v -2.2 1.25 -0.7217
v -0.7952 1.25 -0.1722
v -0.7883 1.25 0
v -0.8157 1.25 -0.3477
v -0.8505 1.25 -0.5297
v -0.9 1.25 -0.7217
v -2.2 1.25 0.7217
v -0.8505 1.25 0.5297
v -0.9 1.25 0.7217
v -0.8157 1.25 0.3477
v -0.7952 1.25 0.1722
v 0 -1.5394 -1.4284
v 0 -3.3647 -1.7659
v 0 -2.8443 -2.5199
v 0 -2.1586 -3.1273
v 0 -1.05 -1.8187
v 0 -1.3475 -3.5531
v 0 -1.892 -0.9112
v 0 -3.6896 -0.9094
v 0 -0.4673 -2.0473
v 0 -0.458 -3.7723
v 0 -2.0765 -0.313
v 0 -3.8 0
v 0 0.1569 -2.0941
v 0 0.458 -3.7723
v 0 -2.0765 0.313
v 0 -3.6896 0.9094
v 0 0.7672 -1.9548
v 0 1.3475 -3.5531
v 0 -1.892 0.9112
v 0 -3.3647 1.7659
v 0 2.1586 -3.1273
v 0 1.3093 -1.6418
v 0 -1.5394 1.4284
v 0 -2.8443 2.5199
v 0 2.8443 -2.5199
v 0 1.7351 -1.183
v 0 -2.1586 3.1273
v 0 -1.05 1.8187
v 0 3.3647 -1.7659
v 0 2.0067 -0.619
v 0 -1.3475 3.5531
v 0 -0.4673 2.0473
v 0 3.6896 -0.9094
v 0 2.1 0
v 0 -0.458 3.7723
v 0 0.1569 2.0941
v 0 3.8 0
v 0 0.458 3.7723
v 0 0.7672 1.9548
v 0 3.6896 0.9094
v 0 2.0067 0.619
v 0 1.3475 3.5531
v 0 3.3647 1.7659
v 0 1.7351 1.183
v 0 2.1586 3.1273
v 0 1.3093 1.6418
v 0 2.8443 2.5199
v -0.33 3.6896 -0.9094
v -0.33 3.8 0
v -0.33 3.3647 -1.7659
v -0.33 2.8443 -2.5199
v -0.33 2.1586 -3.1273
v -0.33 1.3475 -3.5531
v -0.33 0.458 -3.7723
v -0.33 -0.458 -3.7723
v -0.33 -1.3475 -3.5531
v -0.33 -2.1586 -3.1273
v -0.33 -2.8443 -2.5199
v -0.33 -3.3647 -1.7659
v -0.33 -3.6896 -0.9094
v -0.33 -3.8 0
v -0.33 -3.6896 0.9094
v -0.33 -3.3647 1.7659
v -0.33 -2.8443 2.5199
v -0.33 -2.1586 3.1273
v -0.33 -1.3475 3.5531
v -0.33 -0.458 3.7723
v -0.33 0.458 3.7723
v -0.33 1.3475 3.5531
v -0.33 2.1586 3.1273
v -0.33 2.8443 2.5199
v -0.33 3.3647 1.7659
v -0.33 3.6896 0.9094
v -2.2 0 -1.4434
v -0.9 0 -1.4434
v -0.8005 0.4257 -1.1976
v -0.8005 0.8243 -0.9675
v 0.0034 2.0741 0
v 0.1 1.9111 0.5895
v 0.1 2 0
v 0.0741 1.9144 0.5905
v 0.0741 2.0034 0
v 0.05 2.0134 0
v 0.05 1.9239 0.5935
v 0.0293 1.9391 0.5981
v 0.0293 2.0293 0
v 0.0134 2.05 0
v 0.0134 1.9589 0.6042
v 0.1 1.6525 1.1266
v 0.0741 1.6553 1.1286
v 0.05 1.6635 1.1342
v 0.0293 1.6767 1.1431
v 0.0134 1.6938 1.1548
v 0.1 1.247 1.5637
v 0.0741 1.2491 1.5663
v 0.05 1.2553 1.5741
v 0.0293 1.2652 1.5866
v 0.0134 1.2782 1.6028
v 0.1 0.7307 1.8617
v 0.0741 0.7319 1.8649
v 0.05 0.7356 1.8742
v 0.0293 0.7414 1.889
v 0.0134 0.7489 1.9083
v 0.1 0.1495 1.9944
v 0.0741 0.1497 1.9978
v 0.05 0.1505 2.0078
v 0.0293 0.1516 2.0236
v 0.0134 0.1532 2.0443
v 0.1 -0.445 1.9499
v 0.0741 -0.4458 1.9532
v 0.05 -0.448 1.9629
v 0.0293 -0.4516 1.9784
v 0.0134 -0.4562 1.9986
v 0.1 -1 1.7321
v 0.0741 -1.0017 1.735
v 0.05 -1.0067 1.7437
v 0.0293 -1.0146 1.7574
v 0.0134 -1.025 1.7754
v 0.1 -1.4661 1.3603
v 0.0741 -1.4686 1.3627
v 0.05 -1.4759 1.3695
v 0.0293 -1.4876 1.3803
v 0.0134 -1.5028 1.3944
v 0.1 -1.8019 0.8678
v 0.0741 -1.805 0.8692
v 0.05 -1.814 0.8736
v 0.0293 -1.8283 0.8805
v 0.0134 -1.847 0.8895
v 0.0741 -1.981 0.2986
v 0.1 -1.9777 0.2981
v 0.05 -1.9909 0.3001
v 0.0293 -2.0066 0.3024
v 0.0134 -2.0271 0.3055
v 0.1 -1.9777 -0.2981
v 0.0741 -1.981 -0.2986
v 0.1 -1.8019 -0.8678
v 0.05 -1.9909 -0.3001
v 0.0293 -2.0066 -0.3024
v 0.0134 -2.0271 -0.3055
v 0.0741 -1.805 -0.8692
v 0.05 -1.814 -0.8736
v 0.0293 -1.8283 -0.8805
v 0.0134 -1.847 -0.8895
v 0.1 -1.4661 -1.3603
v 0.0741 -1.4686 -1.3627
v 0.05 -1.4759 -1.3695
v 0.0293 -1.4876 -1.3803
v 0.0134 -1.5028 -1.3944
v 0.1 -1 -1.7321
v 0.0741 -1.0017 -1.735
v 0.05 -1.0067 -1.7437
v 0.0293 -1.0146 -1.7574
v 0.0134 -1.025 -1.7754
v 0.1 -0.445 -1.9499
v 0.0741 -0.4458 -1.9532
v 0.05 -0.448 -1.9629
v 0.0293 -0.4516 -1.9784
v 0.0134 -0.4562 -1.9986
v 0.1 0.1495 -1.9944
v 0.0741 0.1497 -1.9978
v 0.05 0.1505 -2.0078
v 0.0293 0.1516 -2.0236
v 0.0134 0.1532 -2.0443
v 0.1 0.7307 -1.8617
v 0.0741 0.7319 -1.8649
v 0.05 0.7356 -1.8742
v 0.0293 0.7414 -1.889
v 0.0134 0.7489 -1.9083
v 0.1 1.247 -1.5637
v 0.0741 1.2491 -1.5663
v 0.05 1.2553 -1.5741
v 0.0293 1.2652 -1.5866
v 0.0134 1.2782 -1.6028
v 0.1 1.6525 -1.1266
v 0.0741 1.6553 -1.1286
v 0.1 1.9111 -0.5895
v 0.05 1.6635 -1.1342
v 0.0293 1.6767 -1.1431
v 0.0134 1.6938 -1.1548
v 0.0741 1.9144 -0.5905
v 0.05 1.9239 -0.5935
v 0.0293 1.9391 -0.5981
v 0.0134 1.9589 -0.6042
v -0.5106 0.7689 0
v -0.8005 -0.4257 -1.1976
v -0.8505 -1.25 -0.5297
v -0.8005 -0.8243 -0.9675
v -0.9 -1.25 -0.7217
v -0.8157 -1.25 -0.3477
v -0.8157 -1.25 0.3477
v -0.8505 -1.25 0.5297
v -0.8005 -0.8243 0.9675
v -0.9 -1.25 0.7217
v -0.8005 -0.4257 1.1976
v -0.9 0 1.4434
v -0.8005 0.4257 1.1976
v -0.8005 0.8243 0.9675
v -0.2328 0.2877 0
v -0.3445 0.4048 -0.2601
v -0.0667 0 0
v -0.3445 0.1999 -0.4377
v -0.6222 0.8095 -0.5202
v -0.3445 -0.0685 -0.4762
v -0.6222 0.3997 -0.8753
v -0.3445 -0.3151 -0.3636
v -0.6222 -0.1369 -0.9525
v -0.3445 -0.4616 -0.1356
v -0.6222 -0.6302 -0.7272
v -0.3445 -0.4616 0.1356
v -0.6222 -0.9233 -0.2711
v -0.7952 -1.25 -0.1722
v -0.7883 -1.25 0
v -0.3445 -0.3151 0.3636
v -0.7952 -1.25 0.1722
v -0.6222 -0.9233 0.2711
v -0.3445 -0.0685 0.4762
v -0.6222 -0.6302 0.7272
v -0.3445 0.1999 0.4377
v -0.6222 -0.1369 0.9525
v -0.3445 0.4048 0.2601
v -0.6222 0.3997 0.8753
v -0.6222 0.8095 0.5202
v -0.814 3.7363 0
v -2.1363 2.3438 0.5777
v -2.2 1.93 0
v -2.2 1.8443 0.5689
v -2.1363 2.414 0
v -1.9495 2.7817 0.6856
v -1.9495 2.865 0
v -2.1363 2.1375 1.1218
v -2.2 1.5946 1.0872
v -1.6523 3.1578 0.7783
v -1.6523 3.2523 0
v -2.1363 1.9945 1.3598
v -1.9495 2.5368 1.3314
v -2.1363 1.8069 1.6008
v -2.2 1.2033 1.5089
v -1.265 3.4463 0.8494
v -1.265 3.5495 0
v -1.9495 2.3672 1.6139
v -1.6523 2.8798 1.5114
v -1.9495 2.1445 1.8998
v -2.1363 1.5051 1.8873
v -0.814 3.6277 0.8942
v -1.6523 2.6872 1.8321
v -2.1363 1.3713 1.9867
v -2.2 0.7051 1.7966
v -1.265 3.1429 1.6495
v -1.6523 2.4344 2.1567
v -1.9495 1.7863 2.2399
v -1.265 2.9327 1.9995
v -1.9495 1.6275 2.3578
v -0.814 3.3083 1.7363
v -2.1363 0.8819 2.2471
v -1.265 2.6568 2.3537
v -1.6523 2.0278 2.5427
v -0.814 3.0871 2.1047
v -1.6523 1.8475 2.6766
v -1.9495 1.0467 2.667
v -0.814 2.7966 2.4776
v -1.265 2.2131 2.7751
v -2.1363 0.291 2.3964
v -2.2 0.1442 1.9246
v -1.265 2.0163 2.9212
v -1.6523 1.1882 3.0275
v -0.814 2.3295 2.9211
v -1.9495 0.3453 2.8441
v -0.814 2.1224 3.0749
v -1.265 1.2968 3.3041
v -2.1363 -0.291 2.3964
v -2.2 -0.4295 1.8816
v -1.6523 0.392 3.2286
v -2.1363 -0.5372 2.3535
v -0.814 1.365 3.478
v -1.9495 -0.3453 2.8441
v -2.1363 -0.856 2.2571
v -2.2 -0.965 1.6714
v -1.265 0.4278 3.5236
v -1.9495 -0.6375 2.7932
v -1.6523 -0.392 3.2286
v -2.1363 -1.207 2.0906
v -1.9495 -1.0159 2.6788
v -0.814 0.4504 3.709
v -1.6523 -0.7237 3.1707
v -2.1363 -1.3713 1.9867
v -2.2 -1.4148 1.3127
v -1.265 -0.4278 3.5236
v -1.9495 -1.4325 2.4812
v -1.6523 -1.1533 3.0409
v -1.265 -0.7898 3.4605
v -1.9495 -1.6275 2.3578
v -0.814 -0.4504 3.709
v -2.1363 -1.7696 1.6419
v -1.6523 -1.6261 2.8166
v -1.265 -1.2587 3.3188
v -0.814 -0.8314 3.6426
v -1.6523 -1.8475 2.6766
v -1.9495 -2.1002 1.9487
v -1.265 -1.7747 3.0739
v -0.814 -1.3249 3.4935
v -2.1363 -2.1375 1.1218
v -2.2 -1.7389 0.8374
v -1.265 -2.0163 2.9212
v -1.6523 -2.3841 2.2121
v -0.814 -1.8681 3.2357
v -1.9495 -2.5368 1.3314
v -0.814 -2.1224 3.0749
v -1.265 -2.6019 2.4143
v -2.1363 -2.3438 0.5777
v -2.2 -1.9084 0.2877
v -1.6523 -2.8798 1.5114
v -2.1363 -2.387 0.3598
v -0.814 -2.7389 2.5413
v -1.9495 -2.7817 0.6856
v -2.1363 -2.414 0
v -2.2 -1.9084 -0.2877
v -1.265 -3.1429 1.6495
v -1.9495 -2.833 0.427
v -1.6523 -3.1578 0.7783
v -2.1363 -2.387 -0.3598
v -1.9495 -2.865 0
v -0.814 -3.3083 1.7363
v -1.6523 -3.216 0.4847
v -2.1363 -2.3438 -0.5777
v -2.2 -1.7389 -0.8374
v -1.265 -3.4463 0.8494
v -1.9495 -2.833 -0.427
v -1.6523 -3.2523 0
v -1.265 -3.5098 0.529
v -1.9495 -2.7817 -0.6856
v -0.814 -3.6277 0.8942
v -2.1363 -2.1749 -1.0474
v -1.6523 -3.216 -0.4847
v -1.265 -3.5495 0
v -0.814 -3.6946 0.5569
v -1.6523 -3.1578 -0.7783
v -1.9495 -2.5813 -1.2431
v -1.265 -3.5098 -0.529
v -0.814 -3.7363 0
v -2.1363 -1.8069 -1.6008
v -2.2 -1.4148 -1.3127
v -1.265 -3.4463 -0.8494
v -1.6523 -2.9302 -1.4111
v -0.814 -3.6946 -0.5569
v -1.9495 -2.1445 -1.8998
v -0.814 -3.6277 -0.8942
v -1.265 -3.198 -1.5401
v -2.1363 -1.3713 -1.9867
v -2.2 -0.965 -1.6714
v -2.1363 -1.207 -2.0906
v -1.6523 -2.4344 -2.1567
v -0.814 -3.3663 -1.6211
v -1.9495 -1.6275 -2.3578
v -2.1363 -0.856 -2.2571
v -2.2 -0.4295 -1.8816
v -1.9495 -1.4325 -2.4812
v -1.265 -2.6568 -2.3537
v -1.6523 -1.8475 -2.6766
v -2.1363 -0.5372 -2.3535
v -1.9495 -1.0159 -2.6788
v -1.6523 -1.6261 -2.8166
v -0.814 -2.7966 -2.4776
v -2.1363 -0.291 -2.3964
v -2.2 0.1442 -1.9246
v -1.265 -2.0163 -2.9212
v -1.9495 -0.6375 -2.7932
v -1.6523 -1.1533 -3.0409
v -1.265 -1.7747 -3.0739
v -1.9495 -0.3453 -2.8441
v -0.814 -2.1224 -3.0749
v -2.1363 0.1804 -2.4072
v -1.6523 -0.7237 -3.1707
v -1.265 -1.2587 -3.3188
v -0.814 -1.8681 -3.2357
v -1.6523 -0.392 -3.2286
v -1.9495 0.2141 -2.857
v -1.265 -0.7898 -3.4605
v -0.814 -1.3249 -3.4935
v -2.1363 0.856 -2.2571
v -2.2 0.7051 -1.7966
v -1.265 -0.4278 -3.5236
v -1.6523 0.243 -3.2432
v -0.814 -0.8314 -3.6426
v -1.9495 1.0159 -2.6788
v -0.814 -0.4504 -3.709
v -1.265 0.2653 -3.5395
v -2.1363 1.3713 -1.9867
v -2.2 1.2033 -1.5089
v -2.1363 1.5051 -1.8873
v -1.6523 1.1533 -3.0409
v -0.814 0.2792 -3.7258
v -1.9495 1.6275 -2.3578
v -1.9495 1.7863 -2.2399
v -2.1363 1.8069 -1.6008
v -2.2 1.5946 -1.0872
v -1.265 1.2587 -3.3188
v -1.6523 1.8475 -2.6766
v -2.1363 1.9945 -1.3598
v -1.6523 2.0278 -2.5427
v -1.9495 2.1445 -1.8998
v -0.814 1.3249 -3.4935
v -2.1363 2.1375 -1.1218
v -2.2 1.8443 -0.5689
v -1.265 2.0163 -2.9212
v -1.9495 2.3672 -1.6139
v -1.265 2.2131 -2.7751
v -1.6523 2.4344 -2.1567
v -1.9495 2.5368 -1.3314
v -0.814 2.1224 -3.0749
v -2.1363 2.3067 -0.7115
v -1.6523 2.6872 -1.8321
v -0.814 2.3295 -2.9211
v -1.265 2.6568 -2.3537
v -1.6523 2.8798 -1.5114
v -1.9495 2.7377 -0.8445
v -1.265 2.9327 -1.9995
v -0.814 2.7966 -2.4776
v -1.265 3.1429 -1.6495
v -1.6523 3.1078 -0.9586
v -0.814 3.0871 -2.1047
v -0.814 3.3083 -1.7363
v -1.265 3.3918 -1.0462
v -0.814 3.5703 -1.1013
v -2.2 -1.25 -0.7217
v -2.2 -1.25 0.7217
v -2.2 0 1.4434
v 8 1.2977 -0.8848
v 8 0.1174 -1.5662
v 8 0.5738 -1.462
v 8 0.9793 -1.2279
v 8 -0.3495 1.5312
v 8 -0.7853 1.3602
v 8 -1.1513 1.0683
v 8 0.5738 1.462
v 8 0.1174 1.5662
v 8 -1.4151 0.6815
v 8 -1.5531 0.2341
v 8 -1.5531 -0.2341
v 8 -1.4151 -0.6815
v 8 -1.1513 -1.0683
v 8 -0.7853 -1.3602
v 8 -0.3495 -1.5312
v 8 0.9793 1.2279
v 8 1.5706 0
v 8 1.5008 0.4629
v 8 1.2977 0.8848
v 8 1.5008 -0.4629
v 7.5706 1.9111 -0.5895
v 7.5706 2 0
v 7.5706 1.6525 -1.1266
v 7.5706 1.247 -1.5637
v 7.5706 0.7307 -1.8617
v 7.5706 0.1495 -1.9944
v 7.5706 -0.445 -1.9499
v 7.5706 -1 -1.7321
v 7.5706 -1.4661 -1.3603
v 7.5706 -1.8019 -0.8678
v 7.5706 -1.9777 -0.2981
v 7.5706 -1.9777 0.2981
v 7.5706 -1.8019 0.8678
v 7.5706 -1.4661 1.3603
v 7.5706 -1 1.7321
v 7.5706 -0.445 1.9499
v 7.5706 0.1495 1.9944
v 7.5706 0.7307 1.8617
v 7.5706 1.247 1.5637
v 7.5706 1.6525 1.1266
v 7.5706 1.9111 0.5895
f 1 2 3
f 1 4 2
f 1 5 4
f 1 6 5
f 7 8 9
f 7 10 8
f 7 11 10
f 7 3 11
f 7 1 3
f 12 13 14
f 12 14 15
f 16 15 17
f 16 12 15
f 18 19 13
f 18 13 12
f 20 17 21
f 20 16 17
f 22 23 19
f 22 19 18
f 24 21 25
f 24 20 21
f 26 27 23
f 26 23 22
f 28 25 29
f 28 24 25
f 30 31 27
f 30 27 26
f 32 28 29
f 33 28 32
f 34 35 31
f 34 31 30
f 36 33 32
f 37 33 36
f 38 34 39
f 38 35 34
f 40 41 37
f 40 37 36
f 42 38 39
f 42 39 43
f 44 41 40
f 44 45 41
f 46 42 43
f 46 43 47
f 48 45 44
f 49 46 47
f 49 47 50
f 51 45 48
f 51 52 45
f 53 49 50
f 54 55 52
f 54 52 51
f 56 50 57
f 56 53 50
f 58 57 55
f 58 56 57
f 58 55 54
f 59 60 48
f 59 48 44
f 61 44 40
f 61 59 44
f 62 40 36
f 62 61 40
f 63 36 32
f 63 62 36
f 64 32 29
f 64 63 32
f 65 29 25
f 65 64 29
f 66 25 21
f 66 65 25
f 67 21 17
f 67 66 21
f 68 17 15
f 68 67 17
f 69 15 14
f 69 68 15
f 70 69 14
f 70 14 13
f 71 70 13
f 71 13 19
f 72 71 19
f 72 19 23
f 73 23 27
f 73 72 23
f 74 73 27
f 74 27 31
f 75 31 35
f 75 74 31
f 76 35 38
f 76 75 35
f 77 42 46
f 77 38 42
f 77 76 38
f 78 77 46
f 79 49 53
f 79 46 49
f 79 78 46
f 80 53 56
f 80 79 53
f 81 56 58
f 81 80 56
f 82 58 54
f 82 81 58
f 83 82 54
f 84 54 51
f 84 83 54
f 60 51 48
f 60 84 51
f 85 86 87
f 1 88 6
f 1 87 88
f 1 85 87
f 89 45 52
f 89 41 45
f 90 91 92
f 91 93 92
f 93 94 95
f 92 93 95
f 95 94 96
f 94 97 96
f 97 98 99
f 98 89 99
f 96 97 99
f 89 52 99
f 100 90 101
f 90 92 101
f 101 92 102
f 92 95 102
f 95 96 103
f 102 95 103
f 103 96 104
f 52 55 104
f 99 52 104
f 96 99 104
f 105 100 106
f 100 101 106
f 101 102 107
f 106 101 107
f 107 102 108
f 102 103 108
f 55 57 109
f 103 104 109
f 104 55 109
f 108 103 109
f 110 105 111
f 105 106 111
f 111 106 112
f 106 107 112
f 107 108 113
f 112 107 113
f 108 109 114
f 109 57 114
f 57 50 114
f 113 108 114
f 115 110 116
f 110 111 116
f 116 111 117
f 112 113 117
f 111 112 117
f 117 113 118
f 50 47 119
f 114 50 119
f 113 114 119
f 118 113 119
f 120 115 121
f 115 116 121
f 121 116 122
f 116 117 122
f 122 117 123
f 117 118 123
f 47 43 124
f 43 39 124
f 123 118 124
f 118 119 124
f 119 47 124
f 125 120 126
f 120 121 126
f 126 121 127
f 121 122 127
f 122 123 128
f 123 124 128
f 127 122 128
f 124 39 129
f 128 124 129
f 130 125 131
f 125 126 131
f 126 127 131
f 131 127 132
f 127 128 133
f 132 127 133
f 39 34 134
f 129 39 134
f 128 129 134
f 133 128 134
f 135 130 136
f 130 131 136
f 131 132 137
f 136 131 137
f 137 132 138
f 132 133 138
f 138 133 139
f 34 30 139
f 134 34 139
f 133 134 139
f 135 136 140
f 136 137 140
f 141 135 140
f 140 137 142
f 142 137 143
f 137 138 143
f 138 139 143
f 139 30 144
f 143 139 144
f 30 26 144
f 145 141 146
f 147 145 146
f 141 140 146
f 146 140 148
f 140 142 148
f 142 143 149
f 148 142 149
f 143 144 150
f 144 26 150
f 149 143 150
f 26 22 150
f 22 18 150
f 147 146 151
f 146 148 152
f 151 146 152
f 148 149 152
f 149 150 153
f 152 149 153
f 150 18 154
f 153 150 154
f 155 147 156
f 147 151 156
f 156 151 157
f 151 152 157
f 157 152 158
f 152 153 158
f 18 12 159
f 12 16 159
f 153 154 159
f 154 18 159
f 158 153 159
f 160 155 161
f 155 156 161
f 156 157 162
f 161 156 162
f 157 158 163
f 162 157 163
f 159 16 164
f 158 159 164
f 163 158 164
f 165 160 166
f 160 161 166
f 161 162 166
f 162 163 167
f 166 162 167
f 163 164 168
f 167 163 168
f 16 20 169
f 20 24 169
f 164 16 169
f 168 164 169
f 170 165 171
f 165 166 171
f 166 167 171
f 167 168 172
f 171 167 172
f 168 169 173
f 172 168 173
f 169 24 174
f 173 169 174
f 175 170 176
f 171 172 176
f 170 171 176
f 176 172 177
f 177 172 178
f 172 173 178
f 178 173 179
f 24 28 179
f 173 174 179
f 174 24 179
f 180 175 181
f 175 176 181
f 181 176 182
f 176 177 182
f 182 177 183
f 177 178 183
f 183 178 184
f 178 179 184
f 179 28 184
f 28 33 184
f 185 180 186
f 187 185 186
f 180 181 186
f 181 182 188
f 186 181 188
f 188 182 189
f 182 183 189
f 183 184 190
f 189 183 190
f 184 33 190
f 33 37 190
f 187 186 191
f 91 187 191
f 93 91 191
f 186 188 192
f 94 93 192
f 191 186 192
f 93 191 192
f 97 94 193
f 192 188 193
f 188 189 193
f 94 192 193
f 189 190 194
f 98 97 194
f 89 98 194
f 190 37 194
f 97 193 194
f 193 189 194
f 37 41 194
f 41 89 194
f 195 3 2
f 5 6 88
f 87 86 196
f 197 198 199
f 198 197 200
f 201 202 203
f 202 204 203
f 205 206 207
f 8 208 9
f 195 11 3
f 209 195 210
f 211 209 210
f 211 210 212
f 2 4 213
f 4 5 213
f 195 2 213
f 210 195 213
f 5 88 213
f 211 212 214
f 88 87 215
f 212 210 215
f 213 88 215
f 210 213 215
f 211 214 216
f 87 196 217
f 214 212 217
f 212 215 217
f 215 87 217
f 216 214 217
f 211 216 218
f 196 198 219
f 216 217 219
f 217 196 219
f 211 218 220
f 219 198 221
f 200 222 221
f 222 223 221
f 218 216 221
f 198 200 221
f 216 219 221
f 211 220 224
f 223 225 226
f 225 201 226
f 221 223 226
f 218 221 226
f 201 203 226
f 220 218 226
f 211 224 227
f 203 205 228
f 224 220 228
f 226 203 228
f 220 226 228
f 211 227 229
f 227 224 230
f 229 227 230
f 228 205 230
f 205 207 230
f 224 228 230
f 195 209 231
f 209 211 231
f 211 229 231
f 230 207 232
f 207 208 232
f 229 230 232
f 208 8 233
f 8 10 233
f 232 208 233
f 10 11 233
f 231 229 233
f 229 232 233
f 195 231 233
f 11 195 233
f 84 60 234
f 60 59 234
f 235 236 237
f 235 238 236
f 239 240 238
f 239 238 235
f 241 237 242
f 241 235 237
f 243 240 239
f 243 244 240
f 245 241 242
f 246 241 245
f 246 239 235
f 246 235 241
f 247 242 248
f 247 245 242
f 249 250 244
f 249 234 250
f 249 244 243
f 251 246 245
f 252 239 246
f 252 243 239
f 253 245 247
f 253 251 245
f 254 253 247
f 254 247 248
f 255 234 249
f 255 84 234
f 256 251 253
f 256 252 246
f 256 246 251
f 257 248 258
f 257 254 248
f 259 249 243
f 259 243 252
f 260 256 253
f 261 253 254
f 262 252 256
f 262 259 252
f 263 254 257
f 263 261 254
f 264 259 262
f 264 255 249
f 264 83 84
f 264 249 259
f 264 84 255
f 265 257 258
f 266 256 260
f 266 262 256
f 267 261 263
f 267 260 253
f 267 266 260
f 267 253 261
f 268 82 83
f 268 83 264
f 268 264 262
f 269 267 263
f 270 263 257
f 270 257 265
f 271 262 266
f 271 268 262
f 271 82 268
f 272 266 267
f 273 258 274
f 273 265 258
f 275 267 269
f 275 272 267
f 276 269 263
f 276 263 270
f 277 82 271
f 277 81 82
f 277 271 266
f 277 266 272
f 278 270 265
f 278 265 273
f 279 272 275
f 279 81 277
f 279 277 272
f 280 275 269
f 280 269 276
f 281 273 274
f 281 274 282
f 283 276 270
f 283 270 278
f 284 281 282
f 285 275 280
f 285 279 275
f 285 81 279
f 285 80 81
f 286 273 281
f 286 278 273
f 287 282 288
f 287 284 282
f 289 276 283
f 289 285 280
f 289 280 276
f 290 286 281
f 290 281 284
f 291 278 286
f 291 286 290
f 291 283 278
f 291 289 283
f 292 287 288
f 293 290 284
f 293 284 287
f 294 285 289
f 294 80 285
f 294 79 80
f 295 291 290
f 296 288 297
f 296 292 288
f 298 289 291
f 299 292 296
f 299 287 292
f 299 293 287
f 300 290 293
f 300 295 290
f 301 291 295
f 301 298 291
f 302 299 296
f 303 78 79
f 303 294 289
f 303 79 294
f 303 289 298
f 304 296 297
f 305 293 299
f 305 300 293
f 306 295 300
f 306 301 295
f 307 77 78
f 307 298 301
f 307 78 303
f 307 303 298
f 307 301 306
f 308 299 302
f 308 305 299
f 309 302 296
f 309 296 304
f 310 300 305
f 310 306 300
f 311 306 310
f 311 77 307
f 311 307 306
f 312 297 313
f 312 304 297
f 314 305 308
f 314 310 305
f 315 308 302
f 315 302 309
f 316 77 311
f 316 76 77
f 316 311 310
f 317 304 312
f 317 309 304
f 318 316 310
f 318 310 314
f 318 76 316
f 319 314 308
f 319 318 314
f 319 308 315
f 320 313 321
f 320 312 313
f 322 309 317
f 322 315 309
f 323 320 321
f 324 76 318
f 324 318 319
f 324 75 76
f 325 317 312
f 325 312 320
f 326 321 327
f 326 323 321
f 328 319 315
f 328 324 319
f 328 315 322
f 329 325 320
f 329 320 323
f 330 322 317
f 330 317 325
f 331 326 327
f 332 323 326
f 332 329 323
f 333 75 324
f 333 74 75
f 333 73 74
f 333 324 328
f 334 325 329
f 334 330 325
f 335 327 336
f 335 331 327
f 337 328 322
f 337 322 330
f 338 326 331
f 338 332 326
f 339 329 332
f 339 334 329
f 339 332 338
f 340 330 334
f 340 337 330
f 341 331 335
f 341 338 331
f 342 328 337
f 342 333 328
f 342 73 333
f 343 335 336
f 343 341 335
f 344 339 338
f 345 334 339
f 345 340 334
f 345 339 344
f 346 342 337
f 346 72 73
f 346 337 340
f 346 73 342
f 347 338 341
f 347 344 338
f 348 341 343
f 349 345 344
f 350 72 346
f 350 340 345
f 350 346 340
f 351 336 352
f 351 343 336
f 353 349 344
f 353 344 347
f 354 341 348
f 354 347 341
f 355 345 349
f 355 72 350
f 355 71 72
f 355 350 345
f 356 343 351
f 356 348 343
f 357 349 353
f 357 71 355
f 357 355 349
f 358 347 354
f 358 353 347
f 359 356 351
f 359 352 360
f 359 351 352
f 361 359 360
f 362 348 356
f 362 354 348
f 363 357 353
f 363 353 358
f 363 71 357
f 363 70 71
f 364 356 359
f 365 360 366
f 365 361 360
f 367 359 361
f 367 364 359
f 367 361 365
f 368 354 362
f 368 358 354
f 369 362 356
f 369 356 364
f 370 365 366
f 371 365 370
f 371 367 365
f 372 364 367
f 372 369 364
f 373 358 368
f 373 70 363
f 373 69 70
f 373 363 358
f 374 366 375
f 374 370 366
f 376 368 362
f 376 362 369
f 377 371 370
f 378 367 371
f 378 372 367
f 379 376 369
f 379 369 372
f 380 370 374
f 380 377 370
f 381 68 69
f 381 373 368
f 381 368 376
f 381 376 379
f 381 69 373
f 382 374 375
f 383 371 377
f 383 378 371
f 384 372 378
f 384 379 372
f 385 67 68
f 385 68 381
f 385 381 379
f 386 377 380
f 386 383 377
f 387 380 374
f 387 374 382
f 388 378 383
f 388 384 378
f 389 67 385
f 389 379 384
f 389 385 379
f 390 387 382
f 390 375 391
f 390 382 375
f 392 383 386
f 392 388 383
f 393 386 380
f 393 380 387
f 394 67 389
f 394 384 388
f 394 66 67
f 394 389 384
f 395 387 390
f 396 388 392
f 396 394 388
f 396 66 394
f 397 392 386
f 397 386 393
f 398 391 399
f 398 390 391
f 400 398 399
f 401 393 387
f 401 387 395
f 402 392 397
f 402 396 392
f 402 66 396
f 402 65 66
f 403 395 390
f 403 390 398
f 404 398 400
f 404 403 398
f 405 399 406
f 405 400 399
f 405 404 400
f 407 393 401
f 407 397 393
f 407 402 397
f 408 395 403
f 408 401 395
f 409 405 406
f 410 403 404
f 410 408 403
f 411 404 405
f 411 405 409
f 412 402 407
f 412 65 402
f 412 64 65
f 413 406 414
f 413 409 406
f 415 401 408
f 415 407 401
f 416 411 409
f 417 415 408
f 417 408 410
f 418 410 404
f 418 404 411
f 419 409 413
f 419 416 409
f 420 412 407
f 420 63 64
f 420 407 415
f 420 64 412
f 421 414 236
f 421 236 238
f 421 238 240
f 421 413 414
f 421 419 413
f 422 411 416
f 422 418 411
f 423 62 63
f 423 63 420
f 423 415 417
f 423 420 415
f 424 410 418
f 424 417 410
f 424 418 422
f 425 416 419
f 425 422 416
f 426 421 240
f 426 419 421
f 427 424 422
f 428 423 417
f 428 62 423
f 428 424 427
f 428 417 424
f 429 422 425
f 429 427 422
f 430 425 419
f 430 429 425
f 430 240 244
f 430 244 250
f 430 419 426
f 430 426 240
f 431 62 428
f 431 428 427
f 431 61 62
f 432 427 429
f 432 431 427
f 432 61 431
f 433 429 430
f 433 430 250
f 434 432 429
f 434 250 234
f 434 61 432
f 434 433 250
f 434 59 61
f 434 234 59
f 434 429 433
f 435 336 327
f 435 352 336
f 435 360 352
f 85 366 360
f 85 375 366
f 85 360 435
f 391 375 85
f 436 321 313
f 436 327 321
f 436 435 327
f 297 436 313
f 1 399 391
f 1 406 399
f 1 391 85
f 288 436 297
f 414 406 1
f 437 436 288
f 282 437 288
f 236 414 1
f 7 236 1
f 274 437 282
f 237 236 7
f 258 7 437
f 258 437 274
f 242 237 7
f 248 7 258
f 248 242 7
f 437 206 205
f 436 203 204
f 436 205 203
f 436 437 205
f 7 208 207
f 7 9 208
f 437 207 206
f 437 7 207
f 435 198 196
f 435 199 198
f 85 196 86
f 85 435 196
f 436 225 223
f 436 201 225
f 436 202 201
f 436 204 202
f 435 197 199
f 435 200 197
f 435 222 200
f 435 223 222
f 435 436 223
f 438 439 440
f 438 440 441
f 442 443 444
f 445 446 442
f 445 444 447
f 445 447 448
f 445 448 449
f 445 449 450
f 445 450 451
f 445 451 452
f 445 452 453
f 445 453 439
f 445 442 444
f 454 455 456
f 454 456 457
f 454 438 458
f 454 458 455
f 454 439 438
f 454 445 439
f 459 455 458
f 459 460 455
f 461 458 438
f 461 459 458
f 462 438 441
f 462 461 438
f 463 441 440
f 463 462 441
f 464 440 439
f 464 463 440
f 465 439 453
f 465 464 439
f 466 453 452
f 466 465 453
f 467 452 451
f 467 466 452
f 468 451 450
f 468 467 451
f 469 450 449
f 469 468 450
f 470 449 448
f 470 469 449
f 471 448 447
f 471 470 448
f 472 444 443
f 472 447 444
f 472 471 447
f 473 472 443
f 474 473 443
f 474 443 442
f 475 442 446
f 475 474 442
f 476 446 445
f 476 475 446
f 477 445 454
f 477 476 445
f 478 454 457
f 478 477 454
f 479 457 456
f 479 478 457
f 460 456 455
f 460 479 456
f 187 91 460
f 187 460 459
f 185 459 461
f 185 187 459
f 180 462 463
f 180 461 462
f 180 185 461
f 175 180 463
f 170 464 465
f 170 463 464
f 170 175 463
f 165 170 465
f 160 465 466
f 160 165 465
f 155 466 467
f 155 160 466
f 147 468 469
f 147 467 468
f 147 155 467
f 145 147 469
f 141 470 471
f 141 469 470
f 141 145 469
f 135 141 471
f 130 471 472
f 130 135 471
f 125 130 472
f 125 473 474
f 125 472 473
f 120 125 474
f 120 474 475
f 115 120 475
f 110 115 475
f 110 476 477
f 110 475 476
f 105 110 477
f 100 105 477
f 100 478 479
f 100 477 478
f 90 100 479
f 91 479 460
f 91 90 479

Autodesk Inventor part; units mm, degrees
ref_plane "YZ Plane" through (0, 0, 0) normal (1, 0, 0) x (0, 1, 0)
ref_plane "XZ Plane" through (0, 0, 0) normal (0, 1, 0) x (-1, 0, 0)
sketch "Эскиз1" plane through (0, 0, 0) normal (0, 0, 1) x (1, 0, 0)
  line L0 (-0.0667, 0) -> (8, 0)
  line L1 (8, 0) -> (8, 2)
  line L2 (8, 2) -> (1.4, 2)
  line L3 (1.4, 2) -> (0.9705, 2)
  line L4 (0.9705, 2) -> (0, 2)
  line L5 (0, 2) -> (0, 3.8)
  line L6 (0, 3.8) -> (-2.2, 3.8)
  line L7 (-2.2, 3.8) -> (-2.2, 1.4434)
  line L8 (-2.2, 1.4434) -> (-0.9, 1.4434)
  line L9 (-0.9, 1.4434) -> (-0.0667, 0)
  line L10 (-4.24, 0) -> (10.04, 0) projected
  line L11 (0, -0.76) -> (0, 4.56) projected
  line L12 (1.4, 2) -> (0, 2) construction
  dimension "d1" = 6.6
  dimension "d2" = 0.4295
  dimension "d3" = 2.2
  dimension "d4" = 1.3
  dimension "d5" = 60
  dimension "d6" = 4
  dimension "d7" = 4
  dimension "d8" = 2.8868
  dimension "d9" = 7.6
  dimension "d26" = 8
revolve "Базовый элемент" add sketch "Эскиз1" angle 360 about axis through (-0.0667, 0, 0) along (1, 0, 0)
sketch "Эскиз2" plane through (-2.2, 0, 0) normal (-1, 0, 0) x (0, 0, 1)
  circle A0 centre (0, 0) radius 1.4434 projected
  line L0 (0, -5.32) -> (0, 5.32) projected
  line L1 (-5.32, 0) -> (5.32, 0) projected
  line L2 (1.4434, 0) -> (0.7217, -1.25)
  line L3 (0.7217, -1.25) -> (-0.7217, -1.25)
  line L4 (-0.7217, -1.25) -> (-1.4434, 0)
  line L5 (-1.4434, 0) -> (-0.7217, 1.25)
  line L6 (-0.7217, 1.25) -> (0.7217, 1.25)
  line L7 (0.7217, 1.25) -> (1.4434, 0)
  point P0 (0, 0)
extrude "Паз" add sketch "Эскиз2" against normal up to next contours L7 A0 | A0 L2 | L6 L0 A0 | A0 L0 L3 | L0 L6 A0 | A0 L3 L0 | L4 A0 | A0 L5
fillet "Сопряжение1" radius 1.87 1 edges at (-2.2, -3.8, 0)
thread "Резьба" size "M4x0.7" class "6g" standard "ISO Metric profile" length 6.6
chamfer "Фаска1" distance 0.4294 distance2 0.4294 1 edges at (8, -2, 0) measured on face at (8, 0.556, 0.0273)
ref_plane "Work Plane1" through (29, 0, 0) normal (0, -1, 0) x (1, 0, 0)
fillet "Fillet2" radius 0.1 1 edges at (0, -2, 0)
equation "\"d1\" = GEL"
equation "\"d3\" = KOH"
equation "\"d4\" = INTI"
equation "\"d6\" = GD"
equation "\"d7\" = BDM"
equation "\"d8\" = 1.1547 * SW"
equation "\"d9\" = KOD"
equation "\"d26\" = NLG"
equation "\"d30\" = R"
equation "\"d17\" = RR"
equation "\"d13\" = GEL"
equation "\"d15\" = -0.5 * SPD + 0.5 * GD"
equation "\"d16\" = GUL"
equation "\"GD\" = NND"
equation "\"NLG\" = 8"
equation "\"GEL\" = 6.6"
equation "\"KOD\" = 7.6"
equation "\"KOH\" = 2.2"
equation "\"INTI\" = 1.3"
equation "\"GAL\" = 0.61345 * PTC"
equation "\"GUL\" = 0.61345 * PTC"
equation "\"BDM\" = NND"
equation "\"SW\" = 2.5"
equation "\"RR\" = 1.87"
equation "\"SPD\" = 3.14117"
equation "\"R\" = 0.1"
equation "\"TOA\" = 30deg"
equation "\"GD1\" = THREADDIA - 1.2269 * PTC"
equation "\"THREADDIA\" = 4"
equation "\"PTC\" = 0.7"
equation "\"NND\" = 4"
equation "\"E0\" = 2.87"
properties part number "JIS B 1174 - M4 x 8" material "Сталь, мягкая"
